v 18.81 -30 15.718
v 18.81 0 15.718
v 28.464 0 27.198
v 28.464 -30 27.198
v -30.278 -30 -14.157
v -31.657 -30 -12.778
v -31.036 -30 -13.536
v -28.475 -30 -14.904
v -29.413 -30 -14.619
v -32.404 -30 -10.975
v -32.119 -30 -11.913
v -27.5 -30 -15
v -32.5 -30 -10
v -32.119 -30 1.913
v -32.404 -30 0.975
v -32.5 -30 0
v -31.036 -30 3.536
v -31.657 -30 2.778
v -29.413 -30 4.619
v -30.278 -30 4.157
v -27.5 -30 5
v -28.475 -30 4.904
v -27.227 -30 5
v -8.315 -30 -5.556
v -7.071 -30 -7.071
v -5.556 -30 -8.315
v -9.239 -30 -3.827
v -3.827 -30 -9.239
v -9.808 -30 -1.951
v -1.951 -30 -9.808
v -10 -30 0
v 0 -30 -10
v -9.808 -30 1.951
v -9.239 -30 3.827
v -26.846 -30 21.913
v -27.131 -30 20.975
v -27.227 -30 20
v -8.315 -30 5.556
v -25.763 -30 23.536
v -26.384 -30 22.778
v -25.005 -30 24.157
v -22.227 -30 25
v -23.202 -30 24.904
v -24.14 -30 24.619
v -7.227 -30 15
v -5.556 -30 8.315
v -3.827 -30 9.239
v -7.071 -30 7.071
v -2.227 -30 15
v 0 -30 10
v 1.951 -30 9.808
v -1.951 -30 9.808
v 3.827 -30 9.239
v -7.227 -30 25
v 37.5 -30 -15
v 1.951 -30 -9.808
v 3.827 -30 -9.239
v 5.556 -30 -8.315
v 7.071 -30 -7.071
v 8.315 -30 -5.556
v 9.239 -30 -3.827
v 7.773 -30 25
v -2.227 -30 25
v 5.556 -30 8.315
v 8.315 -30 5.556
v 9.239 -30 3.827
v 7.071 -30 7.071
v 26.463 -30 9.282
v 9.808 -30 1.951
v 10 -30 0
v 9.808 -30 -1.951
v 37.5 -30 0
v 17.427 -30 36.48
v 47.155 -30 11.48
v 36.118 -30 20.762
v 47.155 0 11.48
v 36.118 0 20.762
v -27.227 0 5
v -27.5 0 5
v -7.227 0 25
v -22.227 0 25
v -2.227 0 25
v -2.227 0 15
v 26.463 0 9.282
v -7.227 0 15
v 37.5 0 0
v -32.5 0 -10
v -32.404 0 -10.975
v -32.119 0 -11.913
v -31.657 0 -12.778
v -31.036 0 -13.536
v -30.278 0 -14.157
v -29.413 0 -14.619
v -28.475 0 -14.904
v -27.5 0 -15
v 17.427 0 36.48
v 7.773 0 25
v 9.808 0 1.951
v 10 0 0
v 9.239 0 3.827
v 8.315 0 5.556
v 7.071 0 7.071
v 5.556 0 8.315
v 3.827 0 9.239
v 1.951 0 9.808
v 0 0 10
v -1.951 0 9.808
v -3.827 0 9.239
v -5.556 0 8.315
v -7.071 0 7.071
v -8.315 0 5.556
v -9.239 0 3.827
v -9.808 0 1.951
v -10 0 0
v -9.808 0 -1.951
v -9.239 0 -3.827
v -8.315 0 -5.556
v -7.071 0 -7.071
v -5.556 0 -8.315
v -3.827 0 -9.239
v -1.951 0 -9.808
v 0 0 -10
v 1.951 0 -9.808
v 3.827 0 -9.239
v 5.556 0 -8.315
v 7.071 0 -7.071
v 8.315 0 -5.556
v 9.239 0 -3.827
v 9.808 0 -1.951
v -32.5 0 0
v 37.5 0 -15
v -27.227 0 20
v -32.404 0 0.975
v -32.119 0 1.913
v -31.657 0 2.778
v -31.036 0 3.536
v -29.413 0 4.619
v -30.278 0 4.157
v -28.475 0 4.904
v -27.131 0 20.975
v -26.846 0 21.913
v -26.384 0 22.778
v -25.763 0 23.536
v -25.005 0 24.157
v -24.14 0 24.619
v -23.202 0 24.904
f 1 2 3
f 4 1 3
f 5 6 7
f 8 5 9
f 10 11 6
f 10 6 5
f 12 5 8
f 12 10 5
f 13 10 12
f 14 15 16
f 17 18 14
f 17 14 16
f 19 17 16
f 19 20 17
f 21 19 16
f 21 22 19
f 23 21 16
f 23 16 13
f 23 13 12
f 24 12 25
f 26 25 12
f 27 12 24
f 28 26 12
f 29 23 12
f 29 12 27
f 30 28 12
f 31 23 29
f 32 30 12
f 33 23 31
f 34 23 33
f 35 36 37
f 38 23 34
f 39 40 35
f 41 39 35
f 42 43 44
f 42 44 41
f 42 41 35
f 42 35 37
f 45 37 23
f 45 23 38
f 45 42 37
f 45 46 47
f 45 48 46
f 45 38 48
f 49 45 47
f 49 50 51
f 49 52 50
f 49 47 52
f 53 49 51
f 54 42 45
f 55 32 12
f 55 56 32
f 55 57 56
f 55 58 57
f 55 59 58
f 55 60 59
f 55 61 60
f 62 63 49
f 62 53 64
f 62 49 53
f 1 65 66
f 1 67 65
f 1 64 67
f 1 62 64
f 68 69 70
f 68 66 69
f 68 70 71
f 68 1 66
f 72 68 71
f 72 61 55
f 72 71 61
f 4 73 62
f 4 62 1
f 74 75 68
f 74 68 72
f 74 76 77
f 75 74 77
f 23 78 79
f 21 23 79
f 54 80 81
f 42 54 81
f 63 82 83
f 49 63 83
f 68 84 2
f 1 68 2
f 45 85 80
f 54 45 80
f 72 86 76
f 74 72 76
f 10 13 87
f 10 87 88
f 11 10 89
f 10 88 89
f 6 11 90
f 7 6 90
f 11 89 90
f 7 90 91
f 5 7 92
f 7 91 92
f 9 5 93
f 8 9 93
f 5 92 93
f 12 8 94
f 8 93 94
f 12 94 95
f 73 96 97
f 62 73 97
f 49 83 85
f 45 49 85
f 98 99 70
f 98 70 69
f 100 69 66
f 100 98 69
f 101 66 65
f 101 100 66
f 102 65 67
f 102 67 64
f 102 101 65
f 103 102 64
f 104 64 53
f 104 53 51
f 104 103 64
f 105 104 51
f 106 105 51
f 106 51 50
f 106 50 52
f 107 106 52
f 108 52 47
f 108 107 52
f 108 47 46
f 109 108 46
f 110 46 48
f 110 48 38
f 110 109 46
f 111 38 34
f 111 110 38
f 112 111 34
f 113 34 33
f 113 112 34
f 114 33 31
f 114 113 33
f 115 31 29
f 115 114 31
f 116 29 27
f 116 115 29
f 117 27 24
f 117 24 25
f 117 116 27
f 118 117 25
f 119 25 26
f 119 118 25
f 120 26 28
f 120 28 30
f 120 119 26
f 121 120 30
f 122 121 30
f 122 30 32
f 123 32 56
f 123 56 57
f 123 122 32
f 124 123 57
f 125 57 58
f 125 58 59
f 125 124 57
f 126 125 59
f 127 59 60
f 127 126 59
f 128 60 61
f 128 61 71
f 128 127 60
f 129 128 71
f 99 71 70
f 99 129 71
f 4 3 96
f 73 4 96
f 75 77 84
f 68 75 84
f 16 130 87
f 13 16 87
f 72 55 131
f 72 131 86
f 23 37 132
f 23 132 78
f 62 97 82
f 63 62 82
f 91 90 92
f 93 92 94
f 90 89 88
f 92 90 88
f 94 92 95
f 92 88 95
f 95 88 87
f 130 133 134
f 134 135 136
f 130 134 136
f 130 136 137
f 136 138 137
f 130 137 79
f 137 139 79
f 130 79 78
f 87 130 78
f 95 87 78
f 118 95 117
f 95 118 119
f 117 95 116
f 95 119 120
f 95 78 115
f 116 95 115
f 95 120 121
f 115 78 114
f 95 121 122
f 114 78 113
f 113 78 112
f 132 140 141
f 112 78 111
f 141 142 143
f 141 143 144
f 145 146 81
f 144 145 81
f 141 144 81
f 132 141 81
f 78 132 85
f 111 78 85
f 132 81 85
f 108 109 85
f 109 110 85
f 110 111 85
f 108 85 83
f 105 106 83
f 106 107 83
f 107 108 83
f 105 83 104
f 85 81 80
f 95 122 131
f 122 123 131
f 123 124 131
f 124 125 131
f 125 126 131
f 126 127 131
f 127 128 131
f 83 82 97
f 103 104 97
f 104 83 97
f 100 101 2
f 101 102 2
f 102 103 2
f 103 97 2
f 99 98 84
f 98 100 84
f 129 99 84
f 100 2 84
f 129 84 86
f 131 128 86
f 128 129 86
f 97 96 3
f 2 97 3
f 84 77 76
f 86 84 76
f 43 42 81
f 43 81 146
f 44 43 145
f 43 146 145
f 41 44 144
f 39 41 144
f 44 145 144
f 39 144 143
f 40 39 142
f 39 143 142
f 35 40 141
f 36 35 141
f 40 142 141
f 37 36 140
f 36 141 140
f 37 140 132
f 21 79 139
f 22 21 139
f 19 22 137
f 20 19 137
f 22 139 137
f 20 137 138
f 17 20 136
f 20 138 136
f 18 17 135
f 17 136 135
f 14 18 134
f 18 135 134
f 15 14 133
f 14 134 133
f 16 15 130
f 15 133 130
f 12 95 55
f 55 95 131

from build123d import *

# Parameters (mm, degrees)
F0_R     = 10
F1_DEPTH = 30


with BuildPart() as f1:
    # F0 (on Front) → F1 (new body)
    with BuildSketch(Plane.XZ):
        with BuildLine():
            ThreePointArc((-32.5, -10), (-31.035534, -13.535534), (-27.5, -15))
            Line((-27.5, -15), (37.5, -15))
            Line((37.5, -15), (37.5, 0))
            Line((37.5, 0), (47.15451, 11.480002))
            Line((47.15451, 11.480002), (36.117656, 20.761832))
            Line((36.117656, 20.761832), (26.463146, 9.28183))
            Line((26.463146, 9.28183), (18.809811, 15.71817))
            Line((18.809811, 15.71817), (28.464321, 27.198172))
            Line((28.464321, 27.198172), (17.427467, 36.480002))
            Line((17.427467, 36.480002), (7.772957, 25))
            Line((7.772957, 25), (-2.227043, 25))
            Line((-2.227043, 25), (-2.227043, 15))
            Line((-2.227043, 15), (-7.227043, 15))
            Line((-7.227043, 15), (-7.227043, 25))
            Line((-7.227043, 25), (-22.227043, 25))
            ThreePointArc((-22.227043, 25), (-25.762577, 23.535534), (-27.227043, 20))
            Line((-27.227043, 20), (-27.227043, 5))
            Line((-27.227043, 5), (-27.5, 5))
            ThreePointArc((-27.5, 5), (-31.035534, 3.535534), (-32.5, 0))
            Line((-32.5, 0), (-32.5, -10))
        make_face()
        Circle(F0_R, mode=Mode.SUBTRACT)
    extrude(amount=F1_DEPTH)


solid = f1.part
